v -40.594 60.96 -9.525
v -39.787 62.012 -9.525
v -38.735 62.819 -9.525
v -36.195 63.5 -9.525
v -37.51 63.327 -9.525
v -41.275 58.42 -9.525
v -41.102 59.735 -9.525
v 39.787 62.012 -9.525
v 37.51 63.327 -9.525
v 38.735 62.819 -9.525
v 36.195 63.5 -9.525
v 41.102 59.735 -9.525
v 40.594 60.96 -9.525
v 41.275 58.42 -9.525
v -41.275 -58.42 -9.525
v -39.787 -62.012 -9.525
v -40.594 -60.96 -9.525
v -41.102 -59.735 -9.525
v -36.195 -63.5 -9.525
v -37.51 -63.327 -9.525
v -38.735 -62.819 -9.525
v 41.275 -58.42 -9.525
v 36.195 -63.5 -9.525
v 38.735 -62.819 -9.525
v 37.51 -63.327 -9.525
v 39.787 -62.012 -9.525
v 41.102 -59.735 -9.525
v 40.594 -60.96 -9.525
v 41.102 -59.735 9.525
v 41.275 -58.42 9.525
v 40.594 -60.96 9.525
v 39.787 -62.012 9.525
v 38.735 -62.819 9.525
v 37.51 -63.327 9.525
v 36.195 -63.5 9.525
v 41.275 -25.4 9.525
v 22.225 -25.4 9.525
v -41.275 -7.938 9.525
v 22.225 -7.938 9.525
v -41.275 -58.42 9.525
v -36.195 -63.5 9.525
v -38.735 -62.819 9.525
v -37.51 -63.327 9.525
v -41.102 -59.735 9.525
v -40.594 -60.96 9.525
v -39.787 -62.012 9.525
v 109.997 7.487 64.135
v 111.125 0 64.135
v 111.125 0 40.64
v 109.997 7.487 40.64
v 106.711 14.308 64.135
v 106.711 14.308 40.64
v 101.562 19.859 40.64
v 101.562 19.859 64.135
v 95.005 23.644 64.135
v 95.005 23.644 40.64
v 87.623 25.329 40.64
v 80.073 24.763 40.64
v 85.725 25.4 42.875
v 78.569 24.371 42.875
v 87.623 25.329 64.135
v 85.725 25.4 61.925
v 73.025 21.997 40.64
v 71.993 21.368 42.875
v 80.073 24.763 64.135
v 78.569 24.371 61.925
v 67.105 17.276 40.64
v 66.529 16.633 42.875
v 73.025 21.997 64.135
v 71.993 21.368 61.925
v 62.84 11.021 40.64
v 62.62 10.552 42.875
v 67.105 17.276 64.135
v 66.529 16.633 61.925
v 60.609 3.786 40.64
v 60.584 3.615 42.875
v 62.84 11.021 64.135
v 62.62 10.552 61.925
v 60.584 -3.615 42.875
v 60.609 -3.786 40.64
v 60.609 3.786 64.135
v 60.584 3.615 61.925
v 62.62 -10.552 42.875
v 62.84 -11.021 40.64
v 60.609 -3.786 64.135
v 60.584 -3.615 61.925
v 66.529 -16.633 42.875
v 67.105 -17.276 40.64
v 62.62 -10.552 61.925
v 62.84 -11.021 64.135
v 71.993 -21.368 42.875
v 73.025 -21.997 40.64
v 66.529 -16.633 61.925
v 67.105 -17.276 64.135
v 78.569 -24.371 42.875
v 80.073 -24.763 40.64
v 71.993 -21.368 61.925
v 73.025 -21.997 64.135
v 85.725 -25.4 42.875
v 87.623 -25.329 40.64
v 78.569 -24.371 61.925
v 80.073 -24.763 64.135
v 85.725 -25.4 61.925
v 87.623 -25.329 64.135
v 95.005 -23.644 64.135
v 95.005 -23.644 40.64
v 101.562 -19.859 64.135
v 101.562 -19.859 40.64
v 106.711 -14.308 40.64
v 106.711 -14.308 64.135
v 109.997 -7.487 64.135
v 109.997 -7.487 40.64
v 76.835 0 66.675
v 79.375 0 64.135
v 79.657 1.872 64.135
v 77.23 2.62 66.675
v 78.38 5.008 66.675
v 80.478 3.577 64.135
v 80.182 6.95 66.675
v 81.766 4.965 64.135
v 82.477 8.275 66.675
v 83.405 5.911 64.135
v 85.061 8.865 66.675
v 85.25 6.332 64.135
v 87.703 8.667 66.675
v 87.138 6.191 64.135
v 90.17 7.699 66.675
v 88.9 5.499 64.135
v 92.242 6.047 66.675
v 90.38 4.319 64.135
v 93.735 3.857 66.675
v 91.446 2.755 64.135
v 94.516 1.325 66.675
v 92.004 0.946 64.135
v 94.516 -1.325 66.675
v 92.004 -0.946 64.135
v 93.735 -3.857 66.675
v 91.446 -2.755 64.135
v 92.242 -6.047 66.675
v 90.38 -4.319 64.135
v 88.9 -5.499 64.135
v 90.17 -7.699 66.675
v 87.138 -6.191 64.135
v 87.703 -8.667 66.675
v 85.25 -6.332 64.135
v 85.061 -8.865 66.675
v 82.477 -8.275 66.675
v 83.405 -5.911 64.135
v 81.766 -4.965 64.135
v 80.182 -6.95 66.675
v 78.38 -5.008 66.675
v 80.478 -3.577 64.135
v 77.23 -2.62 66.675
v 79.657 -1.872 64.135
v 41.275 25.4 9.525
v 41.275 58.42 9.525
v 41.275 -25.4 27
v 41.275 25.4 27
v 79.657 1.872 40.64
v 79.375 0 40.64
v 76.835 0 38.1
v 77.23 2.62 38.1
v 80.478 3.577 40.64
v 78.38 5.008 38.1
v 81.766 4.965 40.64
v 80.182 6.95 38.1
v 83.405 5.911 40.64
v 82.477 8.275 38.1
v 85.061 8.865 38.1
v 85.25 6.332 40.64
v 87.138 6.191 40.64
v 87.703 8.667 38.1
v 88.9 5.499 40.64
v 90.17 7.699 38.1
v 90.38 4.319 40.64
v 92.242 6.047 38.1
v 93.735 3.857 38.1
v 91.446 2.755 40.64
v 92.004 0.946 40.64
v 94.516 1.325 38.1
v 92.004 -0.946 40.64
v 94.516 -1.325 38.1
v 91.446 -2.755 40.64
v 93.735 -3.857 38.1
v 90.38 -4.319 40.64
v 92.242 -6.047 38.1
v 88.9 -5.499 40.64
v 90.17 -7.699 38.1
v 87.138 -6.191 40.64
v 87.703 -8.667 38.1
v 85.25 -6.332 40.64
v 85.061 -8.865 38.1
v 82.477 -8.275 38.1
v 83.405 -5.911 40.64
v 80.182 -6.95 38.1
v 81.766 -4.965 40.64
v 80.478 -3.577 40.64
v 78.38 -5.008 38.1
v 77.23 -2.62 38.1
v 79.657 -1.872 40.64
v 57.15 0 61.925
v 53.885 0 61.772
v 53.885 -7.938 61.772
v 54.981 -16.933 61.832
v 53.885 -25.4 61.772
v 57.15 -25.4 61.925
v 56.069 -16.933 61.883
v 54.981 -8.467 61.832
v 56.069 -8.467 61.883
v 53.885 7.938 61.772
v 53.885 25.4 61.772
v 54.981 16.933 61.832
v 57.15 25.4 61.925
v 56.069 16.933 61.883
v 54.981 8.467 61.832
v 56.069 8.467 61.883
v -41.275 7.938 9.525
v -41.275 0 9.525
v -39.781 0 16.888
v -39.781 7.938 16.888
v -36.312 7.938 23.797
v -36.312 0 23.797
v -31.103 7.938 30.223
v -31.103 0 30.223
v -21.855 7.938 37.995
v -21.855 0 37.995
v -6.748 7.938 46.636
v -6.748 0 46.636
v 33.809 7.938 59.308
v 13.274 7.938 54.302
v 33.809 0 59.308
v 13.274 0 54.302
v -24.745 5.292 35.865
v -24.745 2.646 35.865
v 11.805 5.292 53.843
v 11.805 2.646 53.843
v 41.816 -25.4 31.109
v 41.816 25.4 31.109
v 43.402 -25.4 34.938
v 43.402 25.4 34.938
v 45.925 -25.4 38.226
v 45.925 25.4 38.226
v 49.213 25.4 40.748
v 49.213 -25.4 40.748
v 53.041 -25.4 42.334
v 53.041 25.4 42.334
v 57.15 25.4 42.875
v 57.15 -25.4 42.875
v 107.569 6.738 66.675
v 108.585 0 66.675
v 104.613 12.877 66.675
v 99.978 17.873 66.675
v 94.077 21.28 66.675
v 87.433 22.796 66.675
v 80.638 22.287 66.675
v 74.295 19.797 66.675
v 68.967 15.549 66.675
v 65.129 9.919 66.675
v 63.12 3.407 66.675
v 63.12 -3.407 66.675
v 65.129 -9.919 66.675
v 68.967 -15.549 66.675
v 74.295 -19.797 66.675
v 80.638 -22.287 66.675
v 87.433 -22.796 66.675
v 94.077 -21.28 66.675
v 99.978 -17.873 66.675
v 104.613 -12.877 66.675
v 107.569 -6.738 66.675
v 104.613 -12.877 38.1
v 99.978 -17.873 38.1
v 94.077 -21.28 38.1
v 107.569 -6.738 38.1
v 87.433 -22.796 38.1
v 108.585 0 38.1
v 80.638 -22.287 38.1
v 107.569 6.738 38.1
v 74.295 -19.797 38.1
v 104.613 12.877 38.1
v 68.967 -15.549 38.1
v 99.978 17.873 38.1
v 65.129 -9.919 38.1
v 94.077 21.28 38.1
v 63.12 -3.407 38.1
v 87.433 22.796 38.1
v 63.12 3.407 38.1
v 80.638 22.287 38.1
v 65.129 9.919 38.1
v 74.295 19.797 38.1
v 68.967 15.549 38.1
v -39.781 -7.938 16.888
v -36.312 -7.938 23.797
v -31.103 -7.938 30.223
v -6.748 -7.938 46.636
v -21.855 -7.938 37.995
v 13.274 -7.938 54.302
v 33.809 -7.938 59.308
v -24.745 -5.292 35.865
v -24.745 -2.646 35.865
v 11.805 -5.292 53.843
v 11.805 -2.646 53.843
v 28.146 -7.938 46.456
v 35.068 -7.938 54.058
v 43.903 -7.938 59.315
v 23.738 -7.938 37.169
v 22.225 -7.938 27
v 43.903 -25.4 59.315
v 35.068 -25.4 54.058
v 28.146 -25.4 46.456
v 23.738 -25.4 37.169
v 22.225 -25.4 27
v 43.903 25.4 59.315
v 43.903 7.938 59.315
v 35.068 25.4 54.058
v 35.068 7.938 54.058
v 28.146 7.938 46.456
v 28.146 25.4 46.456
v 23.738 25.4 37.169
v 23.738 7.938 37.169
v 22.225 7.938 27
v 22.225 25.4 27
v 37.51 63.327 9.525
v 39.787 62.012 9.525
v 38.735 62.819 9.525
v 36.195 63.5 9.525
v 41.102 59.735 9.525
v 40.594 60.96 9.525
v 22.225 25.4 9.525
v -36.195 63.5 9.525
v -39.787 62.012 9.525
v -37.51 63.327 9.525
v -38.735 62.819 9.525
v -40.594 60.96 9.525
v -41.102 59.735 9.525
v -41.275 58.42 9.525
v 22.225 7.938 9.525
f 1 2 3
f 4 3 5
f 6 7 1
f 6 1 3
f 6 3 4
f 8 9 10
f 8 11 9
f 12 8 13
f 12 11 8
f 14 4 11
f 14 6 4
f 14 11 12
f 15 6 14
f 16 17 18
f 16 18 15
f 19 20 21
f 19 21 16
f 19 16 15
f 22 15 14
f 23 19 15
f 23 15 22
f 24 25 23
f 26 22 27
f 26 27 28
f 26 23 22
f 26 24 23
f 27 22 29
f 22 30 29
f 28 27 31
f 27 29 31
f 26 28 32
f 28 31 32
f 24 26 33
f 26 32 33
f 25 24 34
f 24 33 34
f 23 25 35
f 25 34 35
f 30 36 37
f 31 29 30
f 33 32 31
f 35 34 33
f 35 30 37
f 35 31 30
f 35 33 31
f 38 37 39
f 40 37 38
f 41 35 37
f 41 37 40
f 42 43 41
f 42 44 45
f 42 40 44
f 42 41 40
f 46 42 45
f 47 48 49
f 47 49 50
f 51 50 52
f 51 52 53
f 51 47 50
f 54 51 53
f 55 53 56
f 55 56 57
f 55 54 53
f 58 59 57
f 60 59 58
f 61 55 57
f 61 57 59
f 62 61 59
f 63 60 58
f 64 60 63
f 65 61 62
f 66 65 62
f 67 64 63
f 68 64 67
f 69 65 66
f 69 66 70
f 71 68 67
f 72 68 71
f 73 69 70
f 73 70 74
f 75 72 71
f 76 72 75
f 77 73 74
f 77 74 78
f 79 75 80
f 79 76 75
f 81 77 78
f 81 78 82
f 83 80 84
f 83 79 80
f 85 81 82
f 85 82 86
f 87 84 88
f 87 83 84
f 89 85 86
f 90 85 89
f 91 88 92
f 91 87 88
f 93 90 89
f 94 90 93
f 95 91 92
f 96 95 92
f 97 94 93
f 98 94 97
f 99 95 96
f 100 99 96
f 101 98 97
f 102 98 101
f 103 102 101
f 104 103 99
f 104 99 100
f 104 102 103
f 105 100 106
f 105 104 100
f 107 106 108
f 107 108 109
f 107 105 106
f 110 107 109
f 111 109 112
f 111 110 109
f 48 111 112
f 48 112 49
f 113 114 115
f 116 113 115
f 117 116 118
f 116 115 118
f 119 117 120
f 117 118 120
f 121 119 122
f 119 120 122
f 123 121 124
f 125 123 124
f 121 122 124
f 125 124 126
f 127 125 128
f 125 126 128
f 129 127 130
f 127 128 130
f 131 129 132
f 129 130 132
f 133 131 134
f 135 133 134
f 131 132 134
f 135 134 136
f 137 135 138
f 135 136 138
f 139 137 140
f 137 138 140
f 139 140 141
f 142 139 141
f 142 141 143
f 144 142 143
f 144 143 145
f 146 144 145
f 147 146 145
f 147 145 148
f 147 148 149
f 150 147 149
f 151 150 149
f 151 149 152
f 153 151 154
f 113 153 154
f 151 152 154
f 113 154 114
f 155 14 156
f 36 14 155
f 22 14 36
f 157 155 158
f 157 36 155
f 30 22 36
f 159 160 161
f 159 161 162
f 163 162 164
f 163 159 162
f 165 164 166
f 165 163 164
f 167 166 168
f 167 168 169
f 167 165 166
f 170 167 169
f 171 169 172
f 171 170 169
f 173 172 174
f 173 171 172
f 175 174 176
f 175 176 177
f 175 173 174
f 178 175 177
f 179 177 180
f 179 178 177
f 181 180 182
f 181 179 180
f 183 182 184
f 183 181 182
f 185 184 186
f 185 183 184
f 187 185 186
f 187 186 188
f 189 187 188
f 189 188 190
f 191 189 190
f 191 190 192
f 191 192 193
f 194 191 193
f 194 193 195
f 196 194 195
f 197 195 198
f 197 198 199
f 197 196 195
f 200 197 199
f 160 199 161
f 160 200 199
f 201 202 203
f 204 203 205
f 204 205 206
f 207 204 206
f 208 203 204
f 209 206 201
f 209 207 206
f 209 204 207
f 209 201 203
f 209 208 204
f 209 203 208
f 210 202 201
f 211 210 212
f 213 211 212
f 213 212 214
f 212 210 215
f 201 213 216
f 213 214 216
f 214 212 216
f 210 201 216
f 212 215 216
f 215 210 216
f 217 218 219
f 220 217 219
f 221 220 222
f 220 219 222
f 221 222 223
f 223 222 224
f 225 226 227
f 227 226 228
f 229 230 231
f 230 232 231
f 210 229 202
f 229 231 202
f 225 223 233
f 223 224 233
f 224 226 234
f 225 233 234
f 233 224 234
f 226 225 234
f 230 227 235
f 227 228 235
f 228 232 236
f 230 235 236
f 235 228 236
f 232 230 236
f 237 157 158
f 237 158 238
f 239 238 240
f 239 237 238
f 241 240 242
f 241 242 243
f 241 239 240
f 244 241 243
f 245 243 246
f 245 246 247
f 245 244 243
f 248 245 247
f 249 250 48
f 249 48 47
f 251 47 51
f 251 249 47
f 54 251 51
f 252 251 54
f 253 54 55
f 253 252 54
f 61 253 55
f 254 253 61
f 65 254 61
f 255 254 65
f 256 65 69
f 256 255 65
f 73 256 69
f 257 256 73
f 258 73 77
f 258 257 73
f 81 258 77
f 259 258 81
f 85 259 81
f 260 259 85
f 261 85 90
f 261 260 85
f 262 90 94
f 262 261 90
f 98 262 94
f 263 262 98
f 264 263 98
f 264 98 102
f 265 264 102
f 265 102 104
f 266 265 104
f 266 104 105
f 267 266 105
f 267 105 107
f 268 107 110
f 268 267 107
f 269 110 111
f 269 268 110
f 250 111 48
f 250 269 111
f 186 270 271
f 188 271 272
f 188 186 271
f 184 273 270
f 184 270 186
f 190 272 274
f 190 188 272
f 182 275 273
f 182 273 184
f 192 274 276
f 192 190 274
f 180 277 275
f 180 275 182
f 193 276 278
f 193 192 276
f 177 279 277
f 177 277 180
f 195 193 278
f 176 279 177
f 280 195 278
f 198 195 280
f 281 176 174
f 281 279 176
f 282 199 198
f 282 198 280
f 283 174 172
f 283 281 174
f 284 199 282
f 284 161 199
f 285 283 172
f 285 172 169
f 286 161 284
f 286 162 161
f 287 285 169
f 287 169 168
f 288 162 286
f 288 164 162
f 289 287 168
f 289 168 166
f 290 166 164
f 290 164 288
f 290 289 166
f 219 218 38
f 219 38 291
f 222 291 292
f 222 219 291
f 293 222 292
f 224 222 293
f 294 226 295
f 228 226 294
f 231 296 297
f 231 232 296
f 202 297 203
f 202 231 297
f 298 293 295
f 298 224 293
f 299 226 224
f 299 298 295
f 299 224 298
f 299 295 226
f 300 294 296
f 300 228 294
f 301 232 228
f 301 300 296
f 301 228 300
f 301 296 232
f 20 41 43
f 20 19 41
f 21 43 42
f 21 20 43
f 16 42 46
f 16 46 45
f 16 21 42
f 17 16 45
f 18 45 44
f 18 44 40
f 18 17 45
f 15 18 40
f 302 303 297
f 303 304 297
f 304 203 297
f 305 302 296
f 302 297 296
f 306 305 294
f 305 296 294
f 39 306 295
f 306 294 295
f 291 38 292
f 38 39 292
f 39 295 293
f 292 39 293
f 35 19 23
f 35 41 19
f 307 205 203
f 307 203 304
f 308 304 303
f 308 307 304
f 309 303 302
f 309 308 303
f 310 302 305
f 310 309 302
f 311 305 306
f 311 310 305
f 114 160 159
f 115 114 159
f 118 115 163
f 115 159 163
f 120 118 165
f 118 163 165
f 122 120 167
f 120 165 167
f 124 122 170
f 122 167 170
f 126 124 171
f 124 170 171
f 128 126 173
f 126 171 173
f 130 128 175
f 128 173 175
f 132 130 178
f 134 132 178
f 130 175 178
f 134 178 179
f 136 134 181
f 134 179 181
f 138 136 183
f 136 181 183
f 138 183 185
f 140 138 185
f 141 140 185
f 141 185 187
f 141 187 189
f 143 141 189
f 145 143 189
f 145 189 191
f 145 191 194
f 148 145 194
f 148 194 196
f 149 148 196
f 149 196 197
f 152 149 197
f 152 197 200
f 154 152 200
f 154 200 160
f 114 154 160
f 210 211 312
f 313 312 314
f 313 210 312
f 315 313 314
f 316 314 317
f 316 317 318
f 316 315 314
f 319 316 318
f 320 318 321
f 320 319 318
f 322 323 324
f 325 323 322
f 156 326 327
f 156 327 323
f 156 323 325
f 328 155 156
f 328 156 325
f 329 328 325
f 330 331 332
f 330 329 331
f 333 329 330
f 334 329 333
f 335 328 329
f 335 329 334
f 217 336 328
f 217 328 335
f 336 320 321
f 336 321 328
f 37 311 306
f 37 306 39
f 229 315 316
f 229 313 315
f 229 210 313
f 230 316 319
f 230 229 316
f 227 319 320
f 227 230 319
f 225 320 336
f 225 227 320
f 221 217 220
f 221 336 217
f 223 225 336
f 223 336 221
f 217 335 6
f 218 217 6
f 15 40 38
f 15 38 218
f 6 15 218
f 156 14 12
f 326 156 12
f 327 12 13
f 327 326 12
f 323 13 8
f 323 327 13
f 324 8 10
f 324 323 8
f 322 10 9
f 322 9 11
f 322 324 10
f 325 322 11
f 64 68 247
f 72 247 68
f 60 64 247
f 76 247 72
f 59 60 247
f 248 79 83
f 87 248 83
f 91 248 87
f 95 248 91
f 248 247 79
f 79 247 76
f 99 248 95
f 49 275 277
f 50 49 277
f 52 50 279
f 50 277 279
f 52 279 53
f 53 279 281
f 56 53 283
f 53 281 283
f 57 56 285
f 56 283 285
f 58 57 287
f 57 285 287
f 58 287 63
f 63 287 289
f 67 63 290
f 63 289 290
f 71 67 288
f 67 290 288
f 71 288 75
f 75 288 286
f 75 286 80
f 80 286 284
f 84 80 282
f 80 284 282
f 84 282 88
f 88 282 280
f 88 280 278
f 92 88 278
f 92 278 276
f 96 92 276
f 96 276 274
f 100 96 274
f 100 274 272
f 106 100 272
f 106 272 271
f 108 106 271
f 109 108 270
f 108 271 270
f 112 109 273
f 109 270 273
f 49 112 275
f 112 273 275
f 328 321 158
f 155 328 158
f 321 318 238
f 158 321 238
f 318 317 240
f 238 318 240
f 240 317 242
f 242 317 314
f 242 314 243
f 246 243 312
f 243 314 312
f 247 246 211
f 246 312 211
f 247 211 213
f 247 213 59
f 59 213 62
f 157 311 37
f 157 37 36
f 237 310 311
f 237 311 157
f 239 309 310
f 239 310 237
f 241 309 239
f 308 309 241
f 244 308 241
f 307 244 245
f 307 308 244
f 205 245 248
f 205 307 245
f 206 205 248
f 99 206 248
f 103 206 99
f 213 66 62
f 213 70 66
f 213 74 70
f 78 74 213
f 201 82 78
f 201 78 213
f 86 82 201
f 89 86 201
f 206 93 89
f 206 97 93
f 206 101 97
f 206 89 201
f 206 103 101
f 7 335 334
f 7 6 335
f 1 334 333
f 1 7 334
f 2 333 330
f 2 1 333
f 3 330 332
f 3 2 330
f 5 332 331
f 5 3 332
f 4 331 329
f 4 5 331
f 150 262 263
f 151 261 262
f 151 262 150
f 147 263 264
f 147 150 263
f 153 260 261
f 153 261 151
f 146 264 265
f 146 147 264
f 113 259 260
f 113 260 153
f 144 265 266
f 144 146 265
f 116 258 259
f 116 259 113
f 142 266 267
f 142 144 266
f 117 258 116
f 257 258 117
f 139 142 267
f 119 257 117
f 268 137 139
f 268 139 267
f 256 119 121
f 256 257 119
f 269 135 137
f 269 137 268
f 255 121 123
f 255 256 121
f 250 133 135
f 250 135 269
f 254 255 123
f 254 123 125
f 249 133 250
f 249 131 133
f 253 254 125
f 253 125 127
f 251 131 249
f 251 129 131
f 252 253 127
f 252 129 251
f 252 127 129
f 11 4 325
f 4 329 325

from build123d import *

# Parameters (mm, degrees)
F1_DEPTH = 63.5
F0_W     = 25.4
F0_H     = 19.05
F2_DEPTH = 25.4
F3_DEPTH = 7.9375
F5_R     = 5.08
F7_D     = 12.7
F8_SIZE  = 2.54


with BuildPart() as f1:
    # F0 (on Front) → F1 (new body, symmetric)
    with BuildSketch(Plane.XZ):
        Polygon((22.225, 9.525), (-41.275, 9.525), (-41.275, -9.525), (41.275, -9.525), (41.275, 9.525), align=None)
    extrude(amount=F1_DEPTH, both=True)

    # F0 (on Front) → F2 (join, symmetric)
    with BuildSketch(Plane.XZ):
        with BuildLine():
            Line((22.225, 27.0002), (22.225, 9.525))
            Line((22.225, 9.525), (41.275, 9.525))
            Line((41.275, 9.525), (41.275, 27.0002))
            ThreePointArc((41.275, 27.0002), (45.9246798487, 38.2255201513), (57.15, 42.8752))
            Line((57.15, 42.8752), (60.325, 42.8752))
            Line((60.325, 42.8752), (60.325, 61.9252))
            Line((60.325, 61.9252), (57.15, 61.9252))
            add(Edge.make_bspline(
                [(53.8854342407, 61.7722898912), (54.9842067368, 61.8365871986), (56.0728453275, 61.8876096574), (57.15, 61.9252)],
                knots=[108.5245810491, 108.5245810491, 108.5245810491, 108.5245810491, 111.5045361635, 111.5045361635, 111.5045361635, 111.5045361635], degree=3))
            ThreePointArc((53.8854342407, 61.7722898912), (31.3258777096, 50.5133948686), (22.225, 27.0002))
        make_face()
        with Locations((73.025, 52.4002)):
            Rectangle(F0_W, F0_H)
    extrude(amount=F2_DEPTH, both=True)

    # F0 (on Front) → F3 (join, symmetric)
    with BuildSketch(Plane.XZ):
        with BuildLine():
            add(Edge.make_bspline(
                [(-41.275, 9.525), (-39.5856284224, 39.4828766469), (13.870125209, 59.4306981306), (53.8854342407, 61.7722898912)],
                knots=[0, 0, 0, 0, 108.5245810491, 108.5245810491, 108.5245810491, 108.5245810491], degree=3))
            Line((-41.275, 9.525), (22.225, 9.525))
            Line((22.225, 9.525), (22.225, 27.0002))
            ThreePointArc((22.225, 27.0002), (31.3258777096, 50.5133948686), (53.8854342407, 61.7722898912))
        make_face()
    extrude(amount=F3_DEPTH, both=True)

    # F0 (on Front) → F4 (revolve)
    with BuildSketch(Plane.XZ):
        Polygon((85.725, 66.675), (85.725, 61.9252), (85.725, 42.8752), (85.725, 38.1), (111.125, 38.1), (111.125, 66.675), align=None)
    revolve(axis=Axis((85.725, 0, 52.3875), (0, 0, 1)))

    # F5
    f5_edges = [f1.edges().sort_by_distance(p)[0] for p in [
        (41.275, -63.5, 0),
        (-41.275, -63.5, 0),
        (41.275, 63.5, 0),
        (-41.275, 63.5, 0),
    ]]
    fillet(f5_edges, radius=F5_R)

    # F7 (through all)
    with Locations(Plane.XY.offset(66.675)):
        with Locations((85.725, 0)):
            Hole(F7_D / 2)

    # F8
    f8_edges = [f1.edges().sort_by_distance(p)[0] for p in [
        (60.325, 0, 66.675),
        (60.325, 0, 38.1),
        (79.375, 0, 66.675),
        (79.375, 0, 38.1),
    ]]
    chamfer(f8_edges, length=F8_SIZE)


solid = f1.part
